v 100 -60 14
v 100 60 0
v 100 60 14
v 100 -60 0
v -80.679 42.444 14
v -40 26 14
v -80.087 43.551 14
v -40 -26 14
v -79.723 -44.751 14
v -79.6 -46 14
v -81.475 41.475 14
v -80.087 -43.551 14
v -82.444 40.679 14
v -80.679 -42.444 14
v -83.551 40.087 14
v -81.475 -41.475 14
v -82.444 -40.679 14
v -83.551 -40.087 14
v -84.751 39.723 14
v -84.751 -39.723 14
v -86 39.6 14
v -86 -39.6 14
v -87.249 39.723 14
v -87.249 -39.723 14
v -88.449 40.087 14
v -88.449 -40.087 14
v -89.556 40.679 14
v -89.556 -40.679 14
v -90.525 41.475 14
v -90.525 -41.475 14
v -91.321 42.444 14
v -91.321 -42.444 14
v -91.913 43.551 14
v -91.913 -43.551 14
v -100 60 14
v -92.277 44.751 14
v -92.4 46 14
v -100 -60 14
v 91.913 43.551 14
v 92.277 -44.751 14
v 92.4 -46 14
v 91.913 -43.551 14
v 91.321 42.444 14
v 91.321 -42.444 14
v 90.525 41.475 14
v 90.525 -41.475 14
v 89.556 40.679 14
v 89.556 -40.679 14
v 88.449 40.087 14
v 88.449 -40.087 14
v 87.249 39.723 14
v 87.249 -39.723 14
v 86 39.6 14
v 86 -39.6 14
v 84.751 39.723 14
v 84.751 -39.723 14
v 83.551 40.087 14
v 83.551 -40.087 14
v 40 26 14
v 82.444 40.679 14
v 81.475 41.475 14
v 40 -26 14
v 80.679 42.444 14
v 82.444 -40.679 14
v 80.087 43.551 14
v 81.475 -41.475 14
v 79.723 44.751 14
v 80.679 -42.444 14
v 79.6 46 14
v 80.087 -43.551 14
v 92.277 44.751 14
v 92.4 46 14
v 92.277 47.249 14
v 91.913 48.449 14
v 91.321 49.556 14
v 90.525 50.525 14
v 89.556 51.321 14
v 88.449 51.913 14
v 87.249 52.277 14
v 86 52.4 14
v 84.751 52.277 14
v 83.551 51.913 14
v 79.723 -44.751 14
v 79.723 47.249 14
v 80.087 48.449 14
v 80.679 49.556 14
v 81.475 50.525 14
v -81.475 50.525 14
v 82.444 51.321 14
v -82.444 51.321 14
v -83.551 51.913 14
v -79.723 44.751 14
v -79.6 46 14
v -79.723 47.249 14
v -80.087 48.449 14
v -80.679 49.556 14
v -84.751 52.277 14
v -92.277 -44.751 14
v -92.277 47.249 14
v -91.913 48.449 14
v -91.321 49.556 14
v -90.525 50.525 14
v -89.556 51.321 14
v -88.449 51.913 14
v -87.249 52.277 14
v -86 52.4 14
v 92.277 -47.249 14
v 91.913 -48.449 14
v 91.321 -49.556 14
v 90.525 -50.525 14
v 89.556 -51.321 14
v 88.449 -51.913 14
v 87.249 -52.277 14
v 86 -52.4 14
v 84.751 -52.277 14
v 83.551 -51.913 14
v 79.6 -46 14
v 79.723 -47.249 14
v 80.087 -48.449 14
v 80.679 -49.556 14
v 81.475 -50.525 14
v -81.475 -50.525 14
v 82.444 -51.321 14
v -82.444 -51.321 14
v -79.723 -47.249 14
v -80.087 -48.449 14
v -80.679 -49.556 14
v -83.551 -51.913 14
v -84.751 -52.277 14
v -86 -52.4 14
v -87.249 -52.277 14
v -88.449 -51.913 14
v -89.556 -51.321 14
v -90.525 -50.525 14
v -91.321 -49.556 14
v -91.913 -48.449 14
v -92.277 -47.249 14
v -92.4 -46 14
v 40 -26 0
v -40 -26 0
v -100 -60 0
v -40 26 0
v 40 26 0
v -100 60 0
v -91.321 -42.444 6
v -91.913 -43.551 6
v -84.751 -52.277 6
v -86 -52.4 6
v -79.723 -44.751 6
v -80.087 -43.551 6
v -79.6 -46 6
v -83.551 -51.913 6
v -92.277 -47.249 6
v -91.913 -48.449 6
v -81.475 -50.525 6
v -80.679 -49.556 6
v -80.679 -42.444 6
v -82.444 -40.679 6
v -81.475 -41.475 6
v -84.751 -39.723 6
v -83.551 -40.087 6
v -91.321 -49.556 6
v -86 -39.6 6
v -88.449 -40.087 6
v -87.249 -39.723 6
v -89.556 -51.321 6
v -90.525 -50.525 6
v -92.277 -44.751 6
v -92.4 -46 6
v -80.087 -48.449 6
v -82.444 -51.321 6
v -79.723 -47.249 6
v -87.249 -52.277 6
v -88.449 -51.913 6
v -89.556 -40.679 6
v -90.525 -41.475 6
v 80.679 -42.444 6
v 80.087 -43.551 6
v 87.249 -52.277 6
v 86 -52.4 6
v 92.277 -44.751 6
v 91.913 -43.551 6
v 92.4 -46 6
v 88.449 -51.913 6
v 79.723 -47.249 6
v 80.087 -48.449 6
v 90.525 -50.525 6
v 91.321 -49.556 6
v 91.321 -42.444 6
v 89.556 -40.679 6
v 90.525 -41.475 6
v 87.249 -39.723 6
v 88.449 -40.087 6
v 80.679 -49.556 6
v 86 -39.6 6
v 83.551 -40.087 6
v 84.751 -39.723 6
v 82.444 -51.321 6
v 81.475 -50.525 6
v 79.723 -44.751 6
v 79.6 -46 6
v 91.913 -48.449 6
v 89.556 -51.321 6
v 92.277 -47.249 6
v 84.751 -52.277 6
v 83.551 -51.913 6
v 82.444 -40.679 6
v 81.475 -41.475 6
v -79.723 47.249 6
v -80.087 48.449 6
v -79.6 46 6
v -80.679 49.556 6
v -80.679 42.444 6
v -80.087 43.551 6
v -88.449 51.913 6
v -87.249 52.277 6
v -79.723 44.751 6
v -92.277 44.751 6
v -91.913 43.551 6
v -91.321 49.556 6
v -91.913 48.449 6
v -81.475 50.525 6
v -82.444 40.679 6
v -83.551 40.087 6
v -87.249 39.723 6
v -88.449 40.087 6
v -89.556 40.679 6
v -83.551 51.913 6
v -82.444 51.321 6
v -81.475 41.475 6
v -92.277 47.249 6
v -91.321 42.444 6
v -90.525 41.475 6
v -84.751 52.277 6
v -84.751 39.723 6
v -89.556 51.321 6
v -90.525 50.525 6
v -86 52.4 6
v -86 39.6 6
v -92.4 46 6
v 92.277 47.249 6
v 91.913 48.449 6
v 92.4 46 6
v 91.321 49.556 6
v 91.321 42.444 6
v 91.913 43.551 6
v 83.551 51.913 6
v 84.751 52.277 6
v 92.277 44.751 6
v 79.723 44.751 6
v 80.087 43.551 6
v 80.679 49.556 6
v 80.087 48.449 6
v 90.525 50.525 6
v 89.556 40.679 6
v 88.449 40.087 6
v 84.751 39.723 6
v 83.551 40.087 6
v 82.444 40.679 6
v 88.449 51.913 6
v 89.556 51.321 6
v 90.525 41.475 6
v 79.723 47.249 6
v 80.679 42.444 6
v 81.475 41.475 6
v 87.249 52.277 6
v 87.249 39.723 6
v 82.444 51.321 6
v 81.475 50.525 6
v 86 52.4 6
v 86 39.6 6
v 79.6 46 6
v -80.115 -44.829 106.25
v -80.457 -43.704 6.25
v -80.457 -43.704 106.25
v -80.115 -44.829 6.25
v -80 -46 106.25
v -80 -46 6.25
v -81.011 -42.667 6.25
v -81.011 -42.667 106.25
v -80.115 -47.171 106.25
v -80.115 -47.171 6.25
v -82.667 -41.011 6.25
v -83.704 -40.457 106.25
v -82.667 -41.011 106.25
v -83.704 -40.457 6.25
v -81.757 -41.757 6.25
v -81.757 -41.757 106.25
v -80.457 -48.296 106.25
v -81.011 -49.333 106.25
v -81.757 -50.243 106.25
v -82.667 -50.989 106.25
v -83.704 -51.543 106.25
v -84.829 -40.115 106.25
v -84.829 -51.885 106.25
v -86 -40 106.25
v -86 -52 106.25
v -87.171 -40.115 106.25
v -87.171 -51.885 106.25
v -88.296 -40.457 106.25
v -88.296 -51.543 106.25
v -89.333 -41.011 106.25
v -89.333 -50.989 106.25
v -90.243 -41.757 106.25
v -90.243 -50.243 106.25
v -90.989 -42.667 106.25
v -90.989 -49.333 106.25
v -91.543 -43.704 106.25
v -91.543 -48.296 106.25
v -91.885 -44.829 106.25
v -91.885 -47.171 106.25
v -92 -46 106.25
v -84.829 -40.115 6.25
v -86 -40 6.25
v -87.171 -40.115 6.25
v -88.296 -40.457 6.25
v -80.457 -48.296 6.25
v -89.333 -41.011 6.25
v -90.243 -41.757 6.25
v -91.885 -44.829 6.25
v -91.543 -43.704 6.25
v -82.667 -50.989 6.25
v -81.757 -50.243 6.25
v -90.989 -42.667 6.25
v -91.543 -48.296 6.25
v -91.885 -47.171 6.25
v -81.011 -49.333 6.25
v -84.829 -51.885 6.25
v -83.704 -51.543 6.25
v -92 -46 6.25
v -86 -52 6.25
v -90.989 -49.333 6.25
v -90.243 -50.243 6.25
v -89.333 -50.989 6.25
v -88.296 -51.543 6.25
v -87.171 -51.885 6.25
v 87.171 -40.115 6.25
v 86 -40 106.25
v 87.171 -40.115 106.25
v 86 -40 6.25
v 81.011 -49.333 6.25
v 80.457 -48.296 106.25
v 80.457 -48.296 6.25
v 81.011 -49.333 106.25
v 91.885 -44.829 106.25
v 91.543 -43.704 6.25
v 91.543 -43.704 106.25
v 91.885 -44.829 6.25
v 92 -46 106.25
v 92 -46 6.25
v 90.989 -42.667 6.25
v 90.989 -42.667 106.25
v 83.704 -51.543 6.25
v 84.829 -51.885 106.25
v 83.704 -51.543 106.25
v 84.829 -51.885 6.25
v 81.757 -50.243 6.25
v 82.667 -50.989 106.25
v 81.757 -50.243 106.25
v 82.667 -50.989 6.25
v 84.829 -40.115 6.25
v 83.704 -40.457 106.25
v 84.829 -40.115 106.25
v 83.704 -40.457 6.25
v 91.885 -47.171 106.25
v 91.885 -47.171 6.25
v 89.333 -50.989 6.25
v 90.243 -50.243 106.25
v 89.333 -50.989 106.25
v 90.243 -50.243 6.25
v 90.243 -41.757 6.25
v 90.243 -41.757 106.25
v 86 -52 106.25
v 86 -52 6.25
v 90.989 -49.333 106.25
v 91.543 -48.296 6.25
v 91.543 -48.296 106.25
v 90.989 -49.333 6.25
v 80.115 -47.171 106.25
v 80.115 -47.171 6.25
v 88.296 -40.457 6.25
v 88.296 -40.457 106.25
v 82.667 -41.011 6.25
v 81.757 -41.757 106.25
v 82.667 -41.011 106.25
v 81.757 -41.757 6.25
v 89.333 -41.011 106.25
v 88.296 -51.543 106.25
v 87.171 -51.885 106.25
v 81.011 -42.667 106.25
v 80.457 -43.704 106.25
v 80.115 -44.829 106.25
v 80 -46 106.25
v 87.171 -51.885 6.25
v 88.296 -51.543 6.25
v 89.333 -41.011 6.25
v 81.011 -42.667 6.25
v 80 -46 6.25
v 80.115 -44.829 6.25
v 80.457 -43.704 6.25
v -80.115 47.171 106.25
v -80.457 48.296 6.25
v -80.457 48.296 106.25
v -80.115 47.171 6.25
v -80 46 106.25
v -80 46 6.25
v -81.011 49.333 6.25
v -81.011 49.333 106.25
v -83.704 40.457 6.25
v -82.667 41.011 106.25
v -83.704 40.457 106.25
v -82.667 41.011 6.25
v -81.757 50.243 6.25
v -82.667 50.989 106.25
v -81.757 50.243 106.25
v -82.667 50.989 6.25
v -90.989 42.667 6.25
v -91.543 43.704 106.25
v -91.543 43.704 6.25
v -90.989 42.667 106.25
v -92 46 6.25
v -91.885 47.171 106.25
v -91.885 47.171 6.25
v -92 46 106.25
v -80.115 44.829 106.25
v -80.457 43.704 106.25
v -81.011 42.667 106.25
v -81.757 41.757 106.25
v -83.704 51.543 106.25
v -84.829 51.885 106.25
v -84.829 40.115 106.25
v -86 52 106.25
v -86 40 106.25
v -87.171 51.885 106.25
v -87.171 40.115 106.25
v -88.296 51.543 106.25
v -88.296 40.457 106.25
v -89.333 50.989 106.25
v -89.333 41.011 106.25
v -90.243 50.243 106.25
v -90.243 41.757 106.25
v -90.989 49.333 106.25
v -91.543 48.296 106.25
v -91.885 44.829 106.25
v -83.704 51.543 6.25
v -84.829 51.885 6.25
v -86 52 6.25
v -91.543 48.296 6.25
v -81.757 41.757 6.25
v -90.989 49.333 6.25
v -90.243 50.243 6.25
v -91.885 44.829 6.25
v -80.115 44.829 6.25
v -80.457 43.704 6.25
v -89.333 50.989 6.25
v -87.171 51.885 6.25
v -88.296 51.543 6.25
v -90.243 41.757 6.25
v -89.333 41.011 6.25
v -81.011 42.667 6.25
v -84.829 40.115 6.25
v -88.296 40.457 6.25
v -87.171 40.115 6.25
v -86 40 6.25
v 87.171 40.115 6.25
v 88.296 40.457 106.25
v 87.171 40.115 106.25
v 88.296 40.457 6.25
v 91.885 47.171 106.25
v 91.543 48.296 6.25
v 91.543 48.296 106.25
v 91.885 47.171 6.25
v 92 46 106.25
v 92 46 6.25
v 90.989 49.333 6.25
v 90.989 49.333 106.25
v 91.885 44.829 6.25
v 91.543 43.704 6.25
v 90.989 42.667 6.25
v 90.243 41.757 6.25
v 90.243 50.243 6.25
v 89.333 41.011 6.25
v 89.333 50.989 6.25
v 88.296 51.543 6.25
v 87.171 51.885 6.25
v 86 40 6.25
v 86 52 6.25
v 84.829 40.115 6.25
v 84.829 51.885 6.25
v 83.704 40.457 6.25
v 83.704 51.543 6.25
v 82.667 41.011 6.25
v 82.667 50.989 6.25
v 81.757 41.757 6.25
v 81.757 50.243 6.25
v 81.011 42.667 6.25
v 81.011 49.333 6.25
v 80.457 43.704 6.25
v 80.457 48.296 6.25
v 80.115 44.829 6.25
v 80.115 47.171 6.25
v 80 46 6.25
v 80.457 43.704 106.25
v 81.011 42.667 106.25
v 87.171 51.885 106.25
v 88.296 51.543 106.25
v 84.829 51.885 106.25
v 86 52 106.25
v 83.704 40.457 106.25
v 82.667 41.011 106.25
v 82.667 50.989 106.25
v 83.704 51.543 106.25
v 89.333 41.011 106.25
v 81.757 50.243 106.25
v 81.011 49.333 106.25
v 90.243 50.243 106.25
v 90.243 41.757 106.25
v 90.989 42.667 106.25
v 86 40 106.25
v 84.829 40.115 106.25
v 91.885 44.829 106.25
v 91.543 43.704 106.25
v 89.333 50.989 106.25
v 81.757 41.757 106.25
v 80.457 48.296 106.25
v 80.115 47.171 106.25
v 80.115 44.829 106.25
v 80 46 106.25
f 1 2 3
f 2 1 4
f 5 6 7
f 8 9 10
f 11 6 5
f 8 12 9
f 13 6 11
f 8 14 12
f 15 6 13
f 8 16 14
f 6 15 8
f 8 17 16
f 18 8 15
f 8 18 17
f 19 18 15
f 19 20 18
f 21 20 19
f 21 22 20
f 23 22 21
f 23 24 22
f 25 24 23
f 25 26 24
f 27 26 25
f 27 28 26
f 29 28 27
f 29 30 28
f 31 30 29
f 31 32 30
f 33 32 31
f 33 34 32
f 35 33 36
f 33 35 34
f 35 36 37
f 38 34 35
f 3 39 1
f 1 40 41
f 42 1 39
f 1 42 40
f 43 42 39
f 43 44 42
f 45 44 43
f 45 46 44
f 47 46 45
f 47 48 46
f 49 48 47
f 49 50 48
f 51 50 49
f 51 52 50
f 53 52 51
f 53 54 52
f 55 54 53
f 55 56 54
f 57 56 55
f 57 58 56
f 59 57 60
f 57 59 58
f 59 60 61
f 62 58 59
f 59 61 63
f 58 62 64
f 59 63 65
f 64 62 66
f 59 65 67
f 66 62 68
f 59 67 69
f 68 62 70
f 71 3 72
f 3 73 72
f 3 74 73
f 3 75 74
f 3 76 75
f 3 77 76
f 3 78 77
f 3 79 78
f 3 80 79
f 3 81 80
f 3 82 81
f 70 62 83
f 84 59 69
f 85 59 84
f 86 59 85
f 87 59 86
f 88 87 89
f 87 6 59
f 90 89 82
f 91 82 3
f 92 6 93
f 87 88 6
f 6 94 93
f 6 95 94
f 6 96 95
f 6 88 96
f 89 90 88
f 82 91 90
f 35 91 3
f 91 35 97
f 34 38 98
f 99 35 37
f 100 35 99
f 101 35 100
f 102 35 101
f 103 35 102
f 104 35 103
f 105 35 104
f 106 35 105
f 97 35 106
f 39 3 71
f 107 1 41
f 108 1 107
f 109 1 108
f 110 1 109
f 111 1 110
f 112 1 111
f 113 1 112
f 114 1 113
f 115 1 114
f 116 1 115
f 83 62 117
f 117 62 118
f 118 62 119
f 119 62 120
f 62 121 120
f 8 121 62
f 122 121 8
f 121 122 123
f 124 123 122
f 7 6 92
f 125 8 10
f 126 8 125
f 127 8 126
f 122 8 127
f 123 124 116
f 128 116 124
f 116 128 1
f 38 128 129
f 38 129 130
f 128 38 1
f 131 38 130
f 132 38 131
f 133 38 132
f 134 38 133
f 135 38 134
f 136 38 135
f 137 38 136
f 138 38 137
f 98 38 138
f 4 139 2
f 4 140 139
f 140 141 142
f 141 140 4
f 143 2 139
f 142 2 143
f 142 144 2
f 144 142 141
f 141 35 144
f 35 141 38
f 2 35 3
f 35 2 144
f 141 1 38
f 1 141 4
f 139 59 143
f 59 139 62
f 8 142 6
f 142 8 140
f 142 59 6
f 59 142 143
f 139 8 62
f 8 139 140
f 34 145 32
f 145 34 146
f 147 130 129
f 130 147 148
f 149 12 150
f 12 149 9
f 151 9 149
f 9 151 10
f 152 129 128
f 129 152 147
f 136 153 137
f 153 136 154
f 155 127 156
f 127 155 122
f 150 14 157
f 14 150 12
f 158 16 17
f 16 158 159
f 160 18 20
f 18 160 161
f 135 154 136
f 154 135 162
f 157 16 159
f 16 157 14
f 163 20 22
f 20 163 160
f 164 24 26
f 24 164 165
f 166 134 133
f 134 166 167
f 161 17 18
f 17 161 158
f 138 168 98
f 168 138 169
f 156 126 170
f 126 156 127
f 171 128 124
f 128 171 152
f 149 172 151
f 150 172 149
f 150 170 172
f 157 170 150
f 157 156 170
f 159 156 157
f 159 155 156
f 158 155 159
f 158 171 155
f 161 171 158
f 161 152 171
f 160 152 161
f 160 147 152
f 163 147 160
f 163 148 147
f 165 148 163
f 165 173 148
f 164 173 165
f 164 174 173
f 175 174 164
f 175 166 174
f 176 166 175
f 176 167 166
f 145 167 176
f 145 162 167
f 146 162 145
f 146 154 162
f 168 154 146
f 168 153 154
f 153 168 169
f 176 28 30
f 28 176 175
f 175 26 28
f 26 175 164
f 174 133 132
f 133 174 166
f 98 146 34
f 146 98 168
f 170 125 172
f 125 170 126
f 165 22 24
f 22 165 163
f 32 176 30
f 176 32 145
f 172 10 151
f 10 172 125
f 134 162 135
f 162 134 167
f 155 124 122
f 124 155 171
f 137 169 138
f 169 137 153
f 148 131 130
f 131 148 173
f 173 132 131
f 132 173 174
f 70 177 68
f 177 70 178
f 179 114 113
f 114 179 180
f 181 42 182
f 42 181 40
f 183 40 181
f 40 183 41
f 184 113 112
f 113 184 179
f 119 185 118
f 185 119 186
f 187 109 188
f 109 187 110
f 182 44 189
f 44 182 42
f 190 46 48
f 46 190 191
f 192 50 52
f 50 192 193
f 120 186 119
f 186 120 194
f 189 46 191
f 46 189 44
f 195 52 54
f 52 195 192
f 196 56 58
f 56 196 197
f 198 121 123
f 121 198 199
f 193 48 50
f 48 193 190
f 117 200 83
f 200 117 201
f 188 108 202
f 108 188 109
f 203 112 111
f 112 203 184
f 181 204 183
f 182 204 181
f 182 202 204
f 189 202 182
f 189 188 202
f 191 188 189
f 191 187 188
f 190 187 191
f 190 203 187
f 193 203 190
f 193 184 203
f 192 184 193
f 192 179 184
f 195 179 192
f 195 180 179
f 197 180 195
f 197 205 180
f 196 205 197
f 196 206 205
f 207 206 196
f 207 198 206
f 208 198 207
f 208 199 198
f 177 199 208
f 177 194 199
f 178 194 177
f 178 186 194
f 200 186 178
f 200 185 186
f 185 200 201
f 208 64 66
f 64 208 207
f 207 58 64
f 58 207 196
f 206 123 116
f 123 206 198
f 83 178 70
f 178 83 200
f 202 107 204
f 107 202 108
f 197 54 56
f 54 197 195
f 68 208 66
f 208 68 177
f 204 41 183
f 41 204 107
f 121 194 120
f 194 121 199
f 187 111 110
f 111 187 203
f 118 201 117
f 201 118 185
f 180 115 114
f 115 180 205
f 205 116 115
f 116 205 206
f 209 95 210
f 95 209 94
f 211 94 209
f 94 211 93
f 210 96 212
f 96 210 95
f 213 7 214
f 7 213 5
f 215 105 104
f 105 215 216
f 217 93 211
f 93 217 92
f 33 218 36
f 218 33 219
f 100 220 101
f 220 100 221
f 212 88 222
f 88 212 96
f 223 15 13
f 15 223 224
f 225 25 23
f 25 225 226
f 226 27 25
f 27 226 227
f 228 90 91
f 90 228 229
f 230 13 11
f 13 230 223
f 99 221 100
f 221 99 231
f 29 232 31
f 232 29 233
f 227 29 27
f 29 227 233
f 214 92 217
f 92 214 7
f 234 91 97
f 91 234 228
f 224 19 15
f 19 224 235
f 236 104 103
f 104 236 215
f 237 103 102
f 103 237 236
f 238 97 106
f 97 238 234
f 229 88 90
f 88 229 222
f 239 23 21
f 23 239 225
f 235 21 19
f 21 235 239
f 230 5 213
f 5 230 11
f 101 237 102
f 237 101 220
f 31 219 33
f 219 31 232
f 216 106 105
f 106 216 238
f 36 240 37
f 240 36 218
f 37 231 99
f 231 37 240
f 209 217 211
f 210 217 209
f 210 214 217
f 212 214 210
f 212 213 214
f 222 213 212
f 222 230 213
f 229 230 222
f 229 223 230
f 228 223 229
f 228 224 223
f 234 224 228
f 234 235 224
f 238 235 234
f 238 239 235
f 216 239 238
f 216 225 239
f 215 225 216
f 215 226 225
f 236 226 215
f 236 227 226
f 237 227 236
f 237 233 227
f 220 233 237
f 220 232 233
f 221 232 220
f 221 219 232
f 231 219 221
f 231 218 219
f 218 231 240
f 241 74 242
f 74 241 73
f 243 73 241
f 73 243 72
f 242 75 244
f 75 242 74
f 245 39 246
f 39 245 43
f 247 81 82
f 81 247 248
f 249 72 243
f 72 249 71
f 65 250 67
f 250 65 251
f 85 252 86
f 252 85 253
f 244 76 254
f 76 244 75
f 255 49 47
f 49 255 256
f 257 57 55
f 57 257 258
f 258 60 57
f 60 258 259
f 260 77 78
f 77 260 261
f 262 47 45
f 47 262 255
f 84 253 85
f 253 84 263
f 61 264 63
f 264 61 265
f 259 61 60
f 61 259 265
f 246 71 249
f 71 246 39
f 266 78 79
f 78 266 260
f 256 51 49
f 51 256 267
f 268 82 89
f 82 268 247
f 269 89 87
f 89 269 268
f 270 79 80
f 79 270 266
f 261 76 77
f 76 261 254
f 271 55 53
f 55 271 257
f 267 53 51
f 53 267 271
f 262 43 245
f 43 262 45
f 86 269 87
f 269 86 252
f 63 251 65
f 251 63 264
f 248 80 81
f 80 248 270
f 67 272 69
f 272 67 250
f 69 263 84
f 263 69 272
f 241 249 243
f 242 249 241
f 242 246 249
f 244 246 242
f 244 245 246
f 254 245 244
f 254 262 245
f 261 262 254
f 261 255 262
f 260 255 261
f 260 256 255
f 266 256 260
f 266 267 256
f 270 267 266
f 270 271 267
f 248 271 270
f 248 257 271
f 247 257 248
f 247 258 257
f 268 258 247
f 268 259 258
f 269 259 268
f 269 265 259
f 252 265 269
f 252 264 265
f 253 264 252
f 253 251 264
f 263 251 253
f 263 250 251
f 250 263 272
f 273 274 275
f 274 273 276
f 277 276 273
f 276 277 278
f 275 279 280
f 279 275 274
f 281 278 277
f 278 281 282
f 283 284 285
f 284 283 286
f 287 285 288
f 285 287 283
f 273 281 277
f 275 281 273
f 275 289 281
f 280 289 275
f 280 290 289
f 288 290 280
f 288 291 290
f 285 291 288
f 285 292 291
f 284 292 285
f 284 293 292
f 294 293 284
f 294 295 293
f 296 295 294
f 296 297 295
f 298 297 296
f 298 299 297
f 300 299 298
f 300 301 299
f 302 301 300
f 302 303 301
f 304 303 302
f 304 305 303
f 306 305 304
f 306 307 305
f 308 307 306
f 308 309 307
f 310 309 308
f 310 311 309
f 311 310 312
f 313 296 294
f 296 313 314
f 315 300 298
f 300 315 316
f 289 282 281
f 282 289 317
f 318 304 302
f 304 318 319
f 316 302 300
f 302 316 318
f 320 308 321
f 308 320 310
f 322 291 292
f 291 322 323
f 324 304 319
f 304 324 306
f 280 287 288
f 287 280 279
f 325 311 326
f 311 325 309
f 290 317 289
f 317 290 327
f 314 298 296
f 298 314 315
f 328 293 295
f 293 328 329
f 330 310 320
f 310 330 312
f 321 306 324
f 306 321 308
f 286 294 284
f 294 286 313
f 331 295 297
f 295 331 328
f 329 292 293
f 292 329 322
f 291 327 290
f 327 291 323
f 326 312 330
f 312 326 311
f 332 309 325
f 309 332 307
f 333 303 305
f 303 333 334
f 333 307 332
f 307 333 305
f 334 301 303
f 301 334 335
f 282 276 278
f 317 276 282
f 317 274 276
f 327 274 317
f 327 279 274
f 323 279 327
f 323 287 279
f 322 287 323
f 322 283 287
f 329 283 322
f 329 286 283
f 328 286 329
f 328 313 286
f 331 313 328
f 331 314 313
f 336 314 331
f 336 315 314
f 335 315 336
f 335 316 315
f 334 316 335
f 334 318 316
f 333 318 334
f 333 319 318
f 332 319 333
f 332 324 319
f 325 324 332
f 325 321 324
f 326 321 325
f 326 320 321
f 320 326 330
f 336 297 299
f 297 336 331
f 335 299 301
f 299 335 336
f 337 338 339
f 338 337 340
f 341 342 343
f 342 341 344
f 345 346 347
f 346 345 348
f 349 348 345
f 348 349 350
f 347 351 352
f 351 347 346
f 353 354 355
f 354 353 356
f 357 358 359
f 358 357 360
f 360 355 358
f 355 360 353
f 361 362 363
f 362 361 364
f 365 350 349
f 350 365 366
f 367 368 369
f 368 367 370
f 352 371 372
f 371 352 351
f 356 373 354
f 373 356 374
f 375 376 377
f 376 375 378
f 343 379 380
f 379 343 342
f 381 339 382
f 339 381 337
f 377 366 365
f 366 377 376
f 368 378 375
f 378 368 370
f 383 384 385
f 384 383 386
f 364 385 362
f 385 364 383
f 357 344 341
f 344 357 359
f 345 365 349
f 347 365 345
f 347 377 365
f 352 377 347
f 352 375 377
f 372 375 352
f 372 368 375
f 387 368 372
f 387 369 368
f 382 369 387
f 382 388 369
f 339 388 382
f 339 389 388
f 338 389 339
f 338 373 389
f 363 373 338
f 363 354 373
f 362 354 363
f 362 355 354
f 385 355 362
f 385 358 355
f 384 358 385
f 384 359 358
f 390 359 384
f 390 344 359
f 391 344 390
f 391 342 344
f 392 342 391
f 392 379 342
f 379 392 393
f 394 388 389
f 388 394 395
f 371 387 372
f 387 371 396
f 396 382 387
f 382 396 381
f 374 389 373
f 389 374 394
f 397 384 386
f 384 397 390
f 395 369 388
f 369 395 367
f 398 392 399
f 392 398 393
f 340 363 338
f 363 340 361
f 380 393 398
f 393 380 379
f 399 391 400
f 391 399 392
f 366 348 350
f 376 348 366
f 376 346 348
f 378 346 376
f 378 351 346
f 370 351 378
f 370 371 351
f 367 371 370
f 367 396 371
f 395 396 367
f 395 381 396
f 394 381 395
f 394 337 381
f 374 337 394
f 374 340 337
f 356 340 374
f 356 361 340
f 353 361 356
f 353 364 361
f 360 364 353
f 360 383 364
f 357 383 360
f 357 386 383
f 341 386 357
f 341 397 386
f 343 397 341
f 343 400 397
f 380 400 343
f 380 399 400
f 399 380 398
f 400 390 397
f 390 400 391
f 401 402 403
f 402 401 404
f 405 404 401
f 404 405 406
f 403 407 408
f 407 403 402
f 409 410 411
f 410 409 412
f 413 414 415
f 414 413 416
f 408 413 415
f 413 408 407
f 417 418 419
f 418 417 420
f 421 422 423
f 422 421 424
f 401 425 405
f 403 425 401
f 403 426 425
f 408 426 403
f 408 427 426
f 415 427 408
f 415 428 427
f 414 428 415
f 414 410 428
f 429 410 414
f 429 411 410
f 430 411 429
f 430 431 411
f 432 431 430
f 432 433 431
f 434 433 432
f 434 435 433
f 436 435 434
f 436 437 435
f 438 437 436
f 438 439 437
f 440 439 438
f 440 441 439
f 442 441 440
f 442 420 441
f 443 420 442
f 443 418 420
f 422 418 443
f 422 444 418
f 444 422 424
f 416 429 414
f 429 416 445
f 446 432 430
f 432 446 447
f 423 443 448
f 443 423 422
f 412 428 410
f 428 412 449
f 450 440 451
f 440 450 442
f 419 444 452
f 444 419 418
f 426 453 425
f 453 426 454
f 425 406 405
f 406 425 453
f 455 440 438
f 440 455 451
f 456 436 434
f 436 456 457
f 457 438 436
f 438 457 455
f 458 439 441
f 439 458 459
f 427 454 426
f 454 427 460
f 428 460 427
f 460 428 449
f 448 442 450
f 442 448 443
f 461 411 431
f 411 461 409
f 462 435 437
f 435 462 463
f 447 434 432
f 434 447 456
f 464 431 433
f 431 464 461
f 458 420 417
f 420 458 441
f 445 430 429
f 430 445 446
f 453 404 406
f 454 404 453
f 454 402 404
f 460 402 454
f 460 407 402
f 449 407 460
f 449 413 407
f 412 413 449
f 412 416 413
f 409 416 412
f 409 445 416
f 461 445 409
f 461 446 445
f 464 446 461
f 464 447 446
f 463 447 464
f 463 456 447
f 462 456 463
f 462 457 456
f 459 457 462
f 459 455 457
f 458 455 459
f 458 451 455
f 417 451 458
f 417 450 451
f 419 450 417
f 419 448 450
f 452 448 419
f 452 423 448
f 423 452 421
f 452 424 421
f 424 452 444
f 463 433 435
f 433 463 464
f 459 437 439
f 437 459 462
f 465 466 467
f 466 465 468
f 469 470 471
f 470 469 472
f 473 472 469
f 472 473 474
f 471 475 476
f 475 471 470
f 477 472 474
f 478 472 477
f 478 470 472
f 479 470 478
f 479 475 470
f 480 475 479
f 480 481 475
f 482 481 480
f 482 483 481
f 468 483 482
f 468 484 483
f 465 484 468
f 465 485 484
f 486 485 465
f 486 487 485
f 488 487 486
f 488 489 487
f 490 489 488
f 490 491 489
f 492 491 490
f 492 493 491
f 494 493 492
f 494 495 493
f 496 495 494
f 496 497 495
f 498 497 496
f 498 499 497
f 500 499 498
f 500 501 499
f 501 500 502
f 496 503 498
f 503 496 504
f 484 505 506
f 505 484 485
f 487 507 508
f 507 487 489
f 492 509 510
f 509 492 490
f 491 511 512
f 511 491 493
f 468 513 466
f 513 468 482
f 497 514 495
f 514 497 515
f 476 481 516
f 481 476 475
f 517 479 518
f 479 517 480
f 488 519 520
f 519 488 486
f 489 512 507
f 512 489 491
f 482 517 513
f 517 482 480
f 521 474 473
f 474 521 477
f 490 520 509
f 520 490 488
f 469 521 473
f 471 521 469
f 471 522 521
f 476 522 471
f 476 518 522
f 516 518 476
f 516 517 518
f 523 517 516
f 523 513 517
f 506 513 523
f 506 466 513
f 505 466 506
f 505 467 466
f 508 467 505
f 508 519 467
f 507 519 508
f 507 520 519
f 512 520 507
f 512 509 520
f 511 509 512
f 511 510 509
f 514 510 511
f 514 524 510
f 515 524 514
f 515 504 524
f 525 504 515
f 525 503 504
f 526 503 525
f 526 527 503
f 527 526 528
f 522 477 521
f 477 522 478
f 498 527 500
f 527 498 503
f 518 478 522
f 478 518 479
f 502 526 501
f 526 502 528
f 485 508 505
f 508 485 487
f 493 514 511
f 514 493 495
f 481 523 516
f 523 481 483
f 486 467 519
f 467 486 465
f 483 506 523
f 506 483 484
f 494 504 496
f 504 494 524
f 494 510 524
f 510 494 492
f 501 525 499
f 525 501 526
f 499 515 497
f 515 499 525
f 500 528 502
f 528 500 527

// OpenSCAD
$fn = 32;

// ------------------------------------------------------------------------
// Frame with four posts: 200 x 120 mm frame, four d12 posts
// Every part is its own module, assembly() places them once.
// ------------------------------------------------------------------------

// --- part 1 ---
module base_frame() {
  difference() {
    translate([-100, -60, 0]) cube([200, 120, 14]);
    translate([-40, -26, -1]) cube([80, 52, 16]);
    translate([-86, -46, 6]) cylinder(h = 9, d = 12.8);
    translate([86, -46, 6]) cylinder(h = 9, d = 12.8);
    translate([-86, 46, 6]) cylinder(h = 9, d = 12.8);
    translate([86, 46, 6]) cylinder(h = 9, d = 12.8);
  }
}

// --- part 2 ---
module post1() {
  cylinder(h = 100, d = 12);
}

// --- part 3 ---
module post2() {
  cylinder(h = 100, d = 12);
}

// --- part 4 ---
module post3() {
  cylinder(h = 100, d = 12);
}

// --- part 5 ---
module post4() {
  cylinder(h = 100, d = 12);
}

// --- assembly ---
module assembly() {
  translate([0, 0, 0]) rotate([0, 0, 0]) base_frame();
  translate([-86, -46, 6.25]) rotate([0, 0, 0]) post1();
  translate([86, -46, 6.25]) rotate([0, 0, 0]) post2();
  translate([-86, 46, 6.25]) rotate([0, 0, 0]) post3();
  translate([86, 46, 6.25]) rotate([0, 0, 0]) post4();
}

assembly();
